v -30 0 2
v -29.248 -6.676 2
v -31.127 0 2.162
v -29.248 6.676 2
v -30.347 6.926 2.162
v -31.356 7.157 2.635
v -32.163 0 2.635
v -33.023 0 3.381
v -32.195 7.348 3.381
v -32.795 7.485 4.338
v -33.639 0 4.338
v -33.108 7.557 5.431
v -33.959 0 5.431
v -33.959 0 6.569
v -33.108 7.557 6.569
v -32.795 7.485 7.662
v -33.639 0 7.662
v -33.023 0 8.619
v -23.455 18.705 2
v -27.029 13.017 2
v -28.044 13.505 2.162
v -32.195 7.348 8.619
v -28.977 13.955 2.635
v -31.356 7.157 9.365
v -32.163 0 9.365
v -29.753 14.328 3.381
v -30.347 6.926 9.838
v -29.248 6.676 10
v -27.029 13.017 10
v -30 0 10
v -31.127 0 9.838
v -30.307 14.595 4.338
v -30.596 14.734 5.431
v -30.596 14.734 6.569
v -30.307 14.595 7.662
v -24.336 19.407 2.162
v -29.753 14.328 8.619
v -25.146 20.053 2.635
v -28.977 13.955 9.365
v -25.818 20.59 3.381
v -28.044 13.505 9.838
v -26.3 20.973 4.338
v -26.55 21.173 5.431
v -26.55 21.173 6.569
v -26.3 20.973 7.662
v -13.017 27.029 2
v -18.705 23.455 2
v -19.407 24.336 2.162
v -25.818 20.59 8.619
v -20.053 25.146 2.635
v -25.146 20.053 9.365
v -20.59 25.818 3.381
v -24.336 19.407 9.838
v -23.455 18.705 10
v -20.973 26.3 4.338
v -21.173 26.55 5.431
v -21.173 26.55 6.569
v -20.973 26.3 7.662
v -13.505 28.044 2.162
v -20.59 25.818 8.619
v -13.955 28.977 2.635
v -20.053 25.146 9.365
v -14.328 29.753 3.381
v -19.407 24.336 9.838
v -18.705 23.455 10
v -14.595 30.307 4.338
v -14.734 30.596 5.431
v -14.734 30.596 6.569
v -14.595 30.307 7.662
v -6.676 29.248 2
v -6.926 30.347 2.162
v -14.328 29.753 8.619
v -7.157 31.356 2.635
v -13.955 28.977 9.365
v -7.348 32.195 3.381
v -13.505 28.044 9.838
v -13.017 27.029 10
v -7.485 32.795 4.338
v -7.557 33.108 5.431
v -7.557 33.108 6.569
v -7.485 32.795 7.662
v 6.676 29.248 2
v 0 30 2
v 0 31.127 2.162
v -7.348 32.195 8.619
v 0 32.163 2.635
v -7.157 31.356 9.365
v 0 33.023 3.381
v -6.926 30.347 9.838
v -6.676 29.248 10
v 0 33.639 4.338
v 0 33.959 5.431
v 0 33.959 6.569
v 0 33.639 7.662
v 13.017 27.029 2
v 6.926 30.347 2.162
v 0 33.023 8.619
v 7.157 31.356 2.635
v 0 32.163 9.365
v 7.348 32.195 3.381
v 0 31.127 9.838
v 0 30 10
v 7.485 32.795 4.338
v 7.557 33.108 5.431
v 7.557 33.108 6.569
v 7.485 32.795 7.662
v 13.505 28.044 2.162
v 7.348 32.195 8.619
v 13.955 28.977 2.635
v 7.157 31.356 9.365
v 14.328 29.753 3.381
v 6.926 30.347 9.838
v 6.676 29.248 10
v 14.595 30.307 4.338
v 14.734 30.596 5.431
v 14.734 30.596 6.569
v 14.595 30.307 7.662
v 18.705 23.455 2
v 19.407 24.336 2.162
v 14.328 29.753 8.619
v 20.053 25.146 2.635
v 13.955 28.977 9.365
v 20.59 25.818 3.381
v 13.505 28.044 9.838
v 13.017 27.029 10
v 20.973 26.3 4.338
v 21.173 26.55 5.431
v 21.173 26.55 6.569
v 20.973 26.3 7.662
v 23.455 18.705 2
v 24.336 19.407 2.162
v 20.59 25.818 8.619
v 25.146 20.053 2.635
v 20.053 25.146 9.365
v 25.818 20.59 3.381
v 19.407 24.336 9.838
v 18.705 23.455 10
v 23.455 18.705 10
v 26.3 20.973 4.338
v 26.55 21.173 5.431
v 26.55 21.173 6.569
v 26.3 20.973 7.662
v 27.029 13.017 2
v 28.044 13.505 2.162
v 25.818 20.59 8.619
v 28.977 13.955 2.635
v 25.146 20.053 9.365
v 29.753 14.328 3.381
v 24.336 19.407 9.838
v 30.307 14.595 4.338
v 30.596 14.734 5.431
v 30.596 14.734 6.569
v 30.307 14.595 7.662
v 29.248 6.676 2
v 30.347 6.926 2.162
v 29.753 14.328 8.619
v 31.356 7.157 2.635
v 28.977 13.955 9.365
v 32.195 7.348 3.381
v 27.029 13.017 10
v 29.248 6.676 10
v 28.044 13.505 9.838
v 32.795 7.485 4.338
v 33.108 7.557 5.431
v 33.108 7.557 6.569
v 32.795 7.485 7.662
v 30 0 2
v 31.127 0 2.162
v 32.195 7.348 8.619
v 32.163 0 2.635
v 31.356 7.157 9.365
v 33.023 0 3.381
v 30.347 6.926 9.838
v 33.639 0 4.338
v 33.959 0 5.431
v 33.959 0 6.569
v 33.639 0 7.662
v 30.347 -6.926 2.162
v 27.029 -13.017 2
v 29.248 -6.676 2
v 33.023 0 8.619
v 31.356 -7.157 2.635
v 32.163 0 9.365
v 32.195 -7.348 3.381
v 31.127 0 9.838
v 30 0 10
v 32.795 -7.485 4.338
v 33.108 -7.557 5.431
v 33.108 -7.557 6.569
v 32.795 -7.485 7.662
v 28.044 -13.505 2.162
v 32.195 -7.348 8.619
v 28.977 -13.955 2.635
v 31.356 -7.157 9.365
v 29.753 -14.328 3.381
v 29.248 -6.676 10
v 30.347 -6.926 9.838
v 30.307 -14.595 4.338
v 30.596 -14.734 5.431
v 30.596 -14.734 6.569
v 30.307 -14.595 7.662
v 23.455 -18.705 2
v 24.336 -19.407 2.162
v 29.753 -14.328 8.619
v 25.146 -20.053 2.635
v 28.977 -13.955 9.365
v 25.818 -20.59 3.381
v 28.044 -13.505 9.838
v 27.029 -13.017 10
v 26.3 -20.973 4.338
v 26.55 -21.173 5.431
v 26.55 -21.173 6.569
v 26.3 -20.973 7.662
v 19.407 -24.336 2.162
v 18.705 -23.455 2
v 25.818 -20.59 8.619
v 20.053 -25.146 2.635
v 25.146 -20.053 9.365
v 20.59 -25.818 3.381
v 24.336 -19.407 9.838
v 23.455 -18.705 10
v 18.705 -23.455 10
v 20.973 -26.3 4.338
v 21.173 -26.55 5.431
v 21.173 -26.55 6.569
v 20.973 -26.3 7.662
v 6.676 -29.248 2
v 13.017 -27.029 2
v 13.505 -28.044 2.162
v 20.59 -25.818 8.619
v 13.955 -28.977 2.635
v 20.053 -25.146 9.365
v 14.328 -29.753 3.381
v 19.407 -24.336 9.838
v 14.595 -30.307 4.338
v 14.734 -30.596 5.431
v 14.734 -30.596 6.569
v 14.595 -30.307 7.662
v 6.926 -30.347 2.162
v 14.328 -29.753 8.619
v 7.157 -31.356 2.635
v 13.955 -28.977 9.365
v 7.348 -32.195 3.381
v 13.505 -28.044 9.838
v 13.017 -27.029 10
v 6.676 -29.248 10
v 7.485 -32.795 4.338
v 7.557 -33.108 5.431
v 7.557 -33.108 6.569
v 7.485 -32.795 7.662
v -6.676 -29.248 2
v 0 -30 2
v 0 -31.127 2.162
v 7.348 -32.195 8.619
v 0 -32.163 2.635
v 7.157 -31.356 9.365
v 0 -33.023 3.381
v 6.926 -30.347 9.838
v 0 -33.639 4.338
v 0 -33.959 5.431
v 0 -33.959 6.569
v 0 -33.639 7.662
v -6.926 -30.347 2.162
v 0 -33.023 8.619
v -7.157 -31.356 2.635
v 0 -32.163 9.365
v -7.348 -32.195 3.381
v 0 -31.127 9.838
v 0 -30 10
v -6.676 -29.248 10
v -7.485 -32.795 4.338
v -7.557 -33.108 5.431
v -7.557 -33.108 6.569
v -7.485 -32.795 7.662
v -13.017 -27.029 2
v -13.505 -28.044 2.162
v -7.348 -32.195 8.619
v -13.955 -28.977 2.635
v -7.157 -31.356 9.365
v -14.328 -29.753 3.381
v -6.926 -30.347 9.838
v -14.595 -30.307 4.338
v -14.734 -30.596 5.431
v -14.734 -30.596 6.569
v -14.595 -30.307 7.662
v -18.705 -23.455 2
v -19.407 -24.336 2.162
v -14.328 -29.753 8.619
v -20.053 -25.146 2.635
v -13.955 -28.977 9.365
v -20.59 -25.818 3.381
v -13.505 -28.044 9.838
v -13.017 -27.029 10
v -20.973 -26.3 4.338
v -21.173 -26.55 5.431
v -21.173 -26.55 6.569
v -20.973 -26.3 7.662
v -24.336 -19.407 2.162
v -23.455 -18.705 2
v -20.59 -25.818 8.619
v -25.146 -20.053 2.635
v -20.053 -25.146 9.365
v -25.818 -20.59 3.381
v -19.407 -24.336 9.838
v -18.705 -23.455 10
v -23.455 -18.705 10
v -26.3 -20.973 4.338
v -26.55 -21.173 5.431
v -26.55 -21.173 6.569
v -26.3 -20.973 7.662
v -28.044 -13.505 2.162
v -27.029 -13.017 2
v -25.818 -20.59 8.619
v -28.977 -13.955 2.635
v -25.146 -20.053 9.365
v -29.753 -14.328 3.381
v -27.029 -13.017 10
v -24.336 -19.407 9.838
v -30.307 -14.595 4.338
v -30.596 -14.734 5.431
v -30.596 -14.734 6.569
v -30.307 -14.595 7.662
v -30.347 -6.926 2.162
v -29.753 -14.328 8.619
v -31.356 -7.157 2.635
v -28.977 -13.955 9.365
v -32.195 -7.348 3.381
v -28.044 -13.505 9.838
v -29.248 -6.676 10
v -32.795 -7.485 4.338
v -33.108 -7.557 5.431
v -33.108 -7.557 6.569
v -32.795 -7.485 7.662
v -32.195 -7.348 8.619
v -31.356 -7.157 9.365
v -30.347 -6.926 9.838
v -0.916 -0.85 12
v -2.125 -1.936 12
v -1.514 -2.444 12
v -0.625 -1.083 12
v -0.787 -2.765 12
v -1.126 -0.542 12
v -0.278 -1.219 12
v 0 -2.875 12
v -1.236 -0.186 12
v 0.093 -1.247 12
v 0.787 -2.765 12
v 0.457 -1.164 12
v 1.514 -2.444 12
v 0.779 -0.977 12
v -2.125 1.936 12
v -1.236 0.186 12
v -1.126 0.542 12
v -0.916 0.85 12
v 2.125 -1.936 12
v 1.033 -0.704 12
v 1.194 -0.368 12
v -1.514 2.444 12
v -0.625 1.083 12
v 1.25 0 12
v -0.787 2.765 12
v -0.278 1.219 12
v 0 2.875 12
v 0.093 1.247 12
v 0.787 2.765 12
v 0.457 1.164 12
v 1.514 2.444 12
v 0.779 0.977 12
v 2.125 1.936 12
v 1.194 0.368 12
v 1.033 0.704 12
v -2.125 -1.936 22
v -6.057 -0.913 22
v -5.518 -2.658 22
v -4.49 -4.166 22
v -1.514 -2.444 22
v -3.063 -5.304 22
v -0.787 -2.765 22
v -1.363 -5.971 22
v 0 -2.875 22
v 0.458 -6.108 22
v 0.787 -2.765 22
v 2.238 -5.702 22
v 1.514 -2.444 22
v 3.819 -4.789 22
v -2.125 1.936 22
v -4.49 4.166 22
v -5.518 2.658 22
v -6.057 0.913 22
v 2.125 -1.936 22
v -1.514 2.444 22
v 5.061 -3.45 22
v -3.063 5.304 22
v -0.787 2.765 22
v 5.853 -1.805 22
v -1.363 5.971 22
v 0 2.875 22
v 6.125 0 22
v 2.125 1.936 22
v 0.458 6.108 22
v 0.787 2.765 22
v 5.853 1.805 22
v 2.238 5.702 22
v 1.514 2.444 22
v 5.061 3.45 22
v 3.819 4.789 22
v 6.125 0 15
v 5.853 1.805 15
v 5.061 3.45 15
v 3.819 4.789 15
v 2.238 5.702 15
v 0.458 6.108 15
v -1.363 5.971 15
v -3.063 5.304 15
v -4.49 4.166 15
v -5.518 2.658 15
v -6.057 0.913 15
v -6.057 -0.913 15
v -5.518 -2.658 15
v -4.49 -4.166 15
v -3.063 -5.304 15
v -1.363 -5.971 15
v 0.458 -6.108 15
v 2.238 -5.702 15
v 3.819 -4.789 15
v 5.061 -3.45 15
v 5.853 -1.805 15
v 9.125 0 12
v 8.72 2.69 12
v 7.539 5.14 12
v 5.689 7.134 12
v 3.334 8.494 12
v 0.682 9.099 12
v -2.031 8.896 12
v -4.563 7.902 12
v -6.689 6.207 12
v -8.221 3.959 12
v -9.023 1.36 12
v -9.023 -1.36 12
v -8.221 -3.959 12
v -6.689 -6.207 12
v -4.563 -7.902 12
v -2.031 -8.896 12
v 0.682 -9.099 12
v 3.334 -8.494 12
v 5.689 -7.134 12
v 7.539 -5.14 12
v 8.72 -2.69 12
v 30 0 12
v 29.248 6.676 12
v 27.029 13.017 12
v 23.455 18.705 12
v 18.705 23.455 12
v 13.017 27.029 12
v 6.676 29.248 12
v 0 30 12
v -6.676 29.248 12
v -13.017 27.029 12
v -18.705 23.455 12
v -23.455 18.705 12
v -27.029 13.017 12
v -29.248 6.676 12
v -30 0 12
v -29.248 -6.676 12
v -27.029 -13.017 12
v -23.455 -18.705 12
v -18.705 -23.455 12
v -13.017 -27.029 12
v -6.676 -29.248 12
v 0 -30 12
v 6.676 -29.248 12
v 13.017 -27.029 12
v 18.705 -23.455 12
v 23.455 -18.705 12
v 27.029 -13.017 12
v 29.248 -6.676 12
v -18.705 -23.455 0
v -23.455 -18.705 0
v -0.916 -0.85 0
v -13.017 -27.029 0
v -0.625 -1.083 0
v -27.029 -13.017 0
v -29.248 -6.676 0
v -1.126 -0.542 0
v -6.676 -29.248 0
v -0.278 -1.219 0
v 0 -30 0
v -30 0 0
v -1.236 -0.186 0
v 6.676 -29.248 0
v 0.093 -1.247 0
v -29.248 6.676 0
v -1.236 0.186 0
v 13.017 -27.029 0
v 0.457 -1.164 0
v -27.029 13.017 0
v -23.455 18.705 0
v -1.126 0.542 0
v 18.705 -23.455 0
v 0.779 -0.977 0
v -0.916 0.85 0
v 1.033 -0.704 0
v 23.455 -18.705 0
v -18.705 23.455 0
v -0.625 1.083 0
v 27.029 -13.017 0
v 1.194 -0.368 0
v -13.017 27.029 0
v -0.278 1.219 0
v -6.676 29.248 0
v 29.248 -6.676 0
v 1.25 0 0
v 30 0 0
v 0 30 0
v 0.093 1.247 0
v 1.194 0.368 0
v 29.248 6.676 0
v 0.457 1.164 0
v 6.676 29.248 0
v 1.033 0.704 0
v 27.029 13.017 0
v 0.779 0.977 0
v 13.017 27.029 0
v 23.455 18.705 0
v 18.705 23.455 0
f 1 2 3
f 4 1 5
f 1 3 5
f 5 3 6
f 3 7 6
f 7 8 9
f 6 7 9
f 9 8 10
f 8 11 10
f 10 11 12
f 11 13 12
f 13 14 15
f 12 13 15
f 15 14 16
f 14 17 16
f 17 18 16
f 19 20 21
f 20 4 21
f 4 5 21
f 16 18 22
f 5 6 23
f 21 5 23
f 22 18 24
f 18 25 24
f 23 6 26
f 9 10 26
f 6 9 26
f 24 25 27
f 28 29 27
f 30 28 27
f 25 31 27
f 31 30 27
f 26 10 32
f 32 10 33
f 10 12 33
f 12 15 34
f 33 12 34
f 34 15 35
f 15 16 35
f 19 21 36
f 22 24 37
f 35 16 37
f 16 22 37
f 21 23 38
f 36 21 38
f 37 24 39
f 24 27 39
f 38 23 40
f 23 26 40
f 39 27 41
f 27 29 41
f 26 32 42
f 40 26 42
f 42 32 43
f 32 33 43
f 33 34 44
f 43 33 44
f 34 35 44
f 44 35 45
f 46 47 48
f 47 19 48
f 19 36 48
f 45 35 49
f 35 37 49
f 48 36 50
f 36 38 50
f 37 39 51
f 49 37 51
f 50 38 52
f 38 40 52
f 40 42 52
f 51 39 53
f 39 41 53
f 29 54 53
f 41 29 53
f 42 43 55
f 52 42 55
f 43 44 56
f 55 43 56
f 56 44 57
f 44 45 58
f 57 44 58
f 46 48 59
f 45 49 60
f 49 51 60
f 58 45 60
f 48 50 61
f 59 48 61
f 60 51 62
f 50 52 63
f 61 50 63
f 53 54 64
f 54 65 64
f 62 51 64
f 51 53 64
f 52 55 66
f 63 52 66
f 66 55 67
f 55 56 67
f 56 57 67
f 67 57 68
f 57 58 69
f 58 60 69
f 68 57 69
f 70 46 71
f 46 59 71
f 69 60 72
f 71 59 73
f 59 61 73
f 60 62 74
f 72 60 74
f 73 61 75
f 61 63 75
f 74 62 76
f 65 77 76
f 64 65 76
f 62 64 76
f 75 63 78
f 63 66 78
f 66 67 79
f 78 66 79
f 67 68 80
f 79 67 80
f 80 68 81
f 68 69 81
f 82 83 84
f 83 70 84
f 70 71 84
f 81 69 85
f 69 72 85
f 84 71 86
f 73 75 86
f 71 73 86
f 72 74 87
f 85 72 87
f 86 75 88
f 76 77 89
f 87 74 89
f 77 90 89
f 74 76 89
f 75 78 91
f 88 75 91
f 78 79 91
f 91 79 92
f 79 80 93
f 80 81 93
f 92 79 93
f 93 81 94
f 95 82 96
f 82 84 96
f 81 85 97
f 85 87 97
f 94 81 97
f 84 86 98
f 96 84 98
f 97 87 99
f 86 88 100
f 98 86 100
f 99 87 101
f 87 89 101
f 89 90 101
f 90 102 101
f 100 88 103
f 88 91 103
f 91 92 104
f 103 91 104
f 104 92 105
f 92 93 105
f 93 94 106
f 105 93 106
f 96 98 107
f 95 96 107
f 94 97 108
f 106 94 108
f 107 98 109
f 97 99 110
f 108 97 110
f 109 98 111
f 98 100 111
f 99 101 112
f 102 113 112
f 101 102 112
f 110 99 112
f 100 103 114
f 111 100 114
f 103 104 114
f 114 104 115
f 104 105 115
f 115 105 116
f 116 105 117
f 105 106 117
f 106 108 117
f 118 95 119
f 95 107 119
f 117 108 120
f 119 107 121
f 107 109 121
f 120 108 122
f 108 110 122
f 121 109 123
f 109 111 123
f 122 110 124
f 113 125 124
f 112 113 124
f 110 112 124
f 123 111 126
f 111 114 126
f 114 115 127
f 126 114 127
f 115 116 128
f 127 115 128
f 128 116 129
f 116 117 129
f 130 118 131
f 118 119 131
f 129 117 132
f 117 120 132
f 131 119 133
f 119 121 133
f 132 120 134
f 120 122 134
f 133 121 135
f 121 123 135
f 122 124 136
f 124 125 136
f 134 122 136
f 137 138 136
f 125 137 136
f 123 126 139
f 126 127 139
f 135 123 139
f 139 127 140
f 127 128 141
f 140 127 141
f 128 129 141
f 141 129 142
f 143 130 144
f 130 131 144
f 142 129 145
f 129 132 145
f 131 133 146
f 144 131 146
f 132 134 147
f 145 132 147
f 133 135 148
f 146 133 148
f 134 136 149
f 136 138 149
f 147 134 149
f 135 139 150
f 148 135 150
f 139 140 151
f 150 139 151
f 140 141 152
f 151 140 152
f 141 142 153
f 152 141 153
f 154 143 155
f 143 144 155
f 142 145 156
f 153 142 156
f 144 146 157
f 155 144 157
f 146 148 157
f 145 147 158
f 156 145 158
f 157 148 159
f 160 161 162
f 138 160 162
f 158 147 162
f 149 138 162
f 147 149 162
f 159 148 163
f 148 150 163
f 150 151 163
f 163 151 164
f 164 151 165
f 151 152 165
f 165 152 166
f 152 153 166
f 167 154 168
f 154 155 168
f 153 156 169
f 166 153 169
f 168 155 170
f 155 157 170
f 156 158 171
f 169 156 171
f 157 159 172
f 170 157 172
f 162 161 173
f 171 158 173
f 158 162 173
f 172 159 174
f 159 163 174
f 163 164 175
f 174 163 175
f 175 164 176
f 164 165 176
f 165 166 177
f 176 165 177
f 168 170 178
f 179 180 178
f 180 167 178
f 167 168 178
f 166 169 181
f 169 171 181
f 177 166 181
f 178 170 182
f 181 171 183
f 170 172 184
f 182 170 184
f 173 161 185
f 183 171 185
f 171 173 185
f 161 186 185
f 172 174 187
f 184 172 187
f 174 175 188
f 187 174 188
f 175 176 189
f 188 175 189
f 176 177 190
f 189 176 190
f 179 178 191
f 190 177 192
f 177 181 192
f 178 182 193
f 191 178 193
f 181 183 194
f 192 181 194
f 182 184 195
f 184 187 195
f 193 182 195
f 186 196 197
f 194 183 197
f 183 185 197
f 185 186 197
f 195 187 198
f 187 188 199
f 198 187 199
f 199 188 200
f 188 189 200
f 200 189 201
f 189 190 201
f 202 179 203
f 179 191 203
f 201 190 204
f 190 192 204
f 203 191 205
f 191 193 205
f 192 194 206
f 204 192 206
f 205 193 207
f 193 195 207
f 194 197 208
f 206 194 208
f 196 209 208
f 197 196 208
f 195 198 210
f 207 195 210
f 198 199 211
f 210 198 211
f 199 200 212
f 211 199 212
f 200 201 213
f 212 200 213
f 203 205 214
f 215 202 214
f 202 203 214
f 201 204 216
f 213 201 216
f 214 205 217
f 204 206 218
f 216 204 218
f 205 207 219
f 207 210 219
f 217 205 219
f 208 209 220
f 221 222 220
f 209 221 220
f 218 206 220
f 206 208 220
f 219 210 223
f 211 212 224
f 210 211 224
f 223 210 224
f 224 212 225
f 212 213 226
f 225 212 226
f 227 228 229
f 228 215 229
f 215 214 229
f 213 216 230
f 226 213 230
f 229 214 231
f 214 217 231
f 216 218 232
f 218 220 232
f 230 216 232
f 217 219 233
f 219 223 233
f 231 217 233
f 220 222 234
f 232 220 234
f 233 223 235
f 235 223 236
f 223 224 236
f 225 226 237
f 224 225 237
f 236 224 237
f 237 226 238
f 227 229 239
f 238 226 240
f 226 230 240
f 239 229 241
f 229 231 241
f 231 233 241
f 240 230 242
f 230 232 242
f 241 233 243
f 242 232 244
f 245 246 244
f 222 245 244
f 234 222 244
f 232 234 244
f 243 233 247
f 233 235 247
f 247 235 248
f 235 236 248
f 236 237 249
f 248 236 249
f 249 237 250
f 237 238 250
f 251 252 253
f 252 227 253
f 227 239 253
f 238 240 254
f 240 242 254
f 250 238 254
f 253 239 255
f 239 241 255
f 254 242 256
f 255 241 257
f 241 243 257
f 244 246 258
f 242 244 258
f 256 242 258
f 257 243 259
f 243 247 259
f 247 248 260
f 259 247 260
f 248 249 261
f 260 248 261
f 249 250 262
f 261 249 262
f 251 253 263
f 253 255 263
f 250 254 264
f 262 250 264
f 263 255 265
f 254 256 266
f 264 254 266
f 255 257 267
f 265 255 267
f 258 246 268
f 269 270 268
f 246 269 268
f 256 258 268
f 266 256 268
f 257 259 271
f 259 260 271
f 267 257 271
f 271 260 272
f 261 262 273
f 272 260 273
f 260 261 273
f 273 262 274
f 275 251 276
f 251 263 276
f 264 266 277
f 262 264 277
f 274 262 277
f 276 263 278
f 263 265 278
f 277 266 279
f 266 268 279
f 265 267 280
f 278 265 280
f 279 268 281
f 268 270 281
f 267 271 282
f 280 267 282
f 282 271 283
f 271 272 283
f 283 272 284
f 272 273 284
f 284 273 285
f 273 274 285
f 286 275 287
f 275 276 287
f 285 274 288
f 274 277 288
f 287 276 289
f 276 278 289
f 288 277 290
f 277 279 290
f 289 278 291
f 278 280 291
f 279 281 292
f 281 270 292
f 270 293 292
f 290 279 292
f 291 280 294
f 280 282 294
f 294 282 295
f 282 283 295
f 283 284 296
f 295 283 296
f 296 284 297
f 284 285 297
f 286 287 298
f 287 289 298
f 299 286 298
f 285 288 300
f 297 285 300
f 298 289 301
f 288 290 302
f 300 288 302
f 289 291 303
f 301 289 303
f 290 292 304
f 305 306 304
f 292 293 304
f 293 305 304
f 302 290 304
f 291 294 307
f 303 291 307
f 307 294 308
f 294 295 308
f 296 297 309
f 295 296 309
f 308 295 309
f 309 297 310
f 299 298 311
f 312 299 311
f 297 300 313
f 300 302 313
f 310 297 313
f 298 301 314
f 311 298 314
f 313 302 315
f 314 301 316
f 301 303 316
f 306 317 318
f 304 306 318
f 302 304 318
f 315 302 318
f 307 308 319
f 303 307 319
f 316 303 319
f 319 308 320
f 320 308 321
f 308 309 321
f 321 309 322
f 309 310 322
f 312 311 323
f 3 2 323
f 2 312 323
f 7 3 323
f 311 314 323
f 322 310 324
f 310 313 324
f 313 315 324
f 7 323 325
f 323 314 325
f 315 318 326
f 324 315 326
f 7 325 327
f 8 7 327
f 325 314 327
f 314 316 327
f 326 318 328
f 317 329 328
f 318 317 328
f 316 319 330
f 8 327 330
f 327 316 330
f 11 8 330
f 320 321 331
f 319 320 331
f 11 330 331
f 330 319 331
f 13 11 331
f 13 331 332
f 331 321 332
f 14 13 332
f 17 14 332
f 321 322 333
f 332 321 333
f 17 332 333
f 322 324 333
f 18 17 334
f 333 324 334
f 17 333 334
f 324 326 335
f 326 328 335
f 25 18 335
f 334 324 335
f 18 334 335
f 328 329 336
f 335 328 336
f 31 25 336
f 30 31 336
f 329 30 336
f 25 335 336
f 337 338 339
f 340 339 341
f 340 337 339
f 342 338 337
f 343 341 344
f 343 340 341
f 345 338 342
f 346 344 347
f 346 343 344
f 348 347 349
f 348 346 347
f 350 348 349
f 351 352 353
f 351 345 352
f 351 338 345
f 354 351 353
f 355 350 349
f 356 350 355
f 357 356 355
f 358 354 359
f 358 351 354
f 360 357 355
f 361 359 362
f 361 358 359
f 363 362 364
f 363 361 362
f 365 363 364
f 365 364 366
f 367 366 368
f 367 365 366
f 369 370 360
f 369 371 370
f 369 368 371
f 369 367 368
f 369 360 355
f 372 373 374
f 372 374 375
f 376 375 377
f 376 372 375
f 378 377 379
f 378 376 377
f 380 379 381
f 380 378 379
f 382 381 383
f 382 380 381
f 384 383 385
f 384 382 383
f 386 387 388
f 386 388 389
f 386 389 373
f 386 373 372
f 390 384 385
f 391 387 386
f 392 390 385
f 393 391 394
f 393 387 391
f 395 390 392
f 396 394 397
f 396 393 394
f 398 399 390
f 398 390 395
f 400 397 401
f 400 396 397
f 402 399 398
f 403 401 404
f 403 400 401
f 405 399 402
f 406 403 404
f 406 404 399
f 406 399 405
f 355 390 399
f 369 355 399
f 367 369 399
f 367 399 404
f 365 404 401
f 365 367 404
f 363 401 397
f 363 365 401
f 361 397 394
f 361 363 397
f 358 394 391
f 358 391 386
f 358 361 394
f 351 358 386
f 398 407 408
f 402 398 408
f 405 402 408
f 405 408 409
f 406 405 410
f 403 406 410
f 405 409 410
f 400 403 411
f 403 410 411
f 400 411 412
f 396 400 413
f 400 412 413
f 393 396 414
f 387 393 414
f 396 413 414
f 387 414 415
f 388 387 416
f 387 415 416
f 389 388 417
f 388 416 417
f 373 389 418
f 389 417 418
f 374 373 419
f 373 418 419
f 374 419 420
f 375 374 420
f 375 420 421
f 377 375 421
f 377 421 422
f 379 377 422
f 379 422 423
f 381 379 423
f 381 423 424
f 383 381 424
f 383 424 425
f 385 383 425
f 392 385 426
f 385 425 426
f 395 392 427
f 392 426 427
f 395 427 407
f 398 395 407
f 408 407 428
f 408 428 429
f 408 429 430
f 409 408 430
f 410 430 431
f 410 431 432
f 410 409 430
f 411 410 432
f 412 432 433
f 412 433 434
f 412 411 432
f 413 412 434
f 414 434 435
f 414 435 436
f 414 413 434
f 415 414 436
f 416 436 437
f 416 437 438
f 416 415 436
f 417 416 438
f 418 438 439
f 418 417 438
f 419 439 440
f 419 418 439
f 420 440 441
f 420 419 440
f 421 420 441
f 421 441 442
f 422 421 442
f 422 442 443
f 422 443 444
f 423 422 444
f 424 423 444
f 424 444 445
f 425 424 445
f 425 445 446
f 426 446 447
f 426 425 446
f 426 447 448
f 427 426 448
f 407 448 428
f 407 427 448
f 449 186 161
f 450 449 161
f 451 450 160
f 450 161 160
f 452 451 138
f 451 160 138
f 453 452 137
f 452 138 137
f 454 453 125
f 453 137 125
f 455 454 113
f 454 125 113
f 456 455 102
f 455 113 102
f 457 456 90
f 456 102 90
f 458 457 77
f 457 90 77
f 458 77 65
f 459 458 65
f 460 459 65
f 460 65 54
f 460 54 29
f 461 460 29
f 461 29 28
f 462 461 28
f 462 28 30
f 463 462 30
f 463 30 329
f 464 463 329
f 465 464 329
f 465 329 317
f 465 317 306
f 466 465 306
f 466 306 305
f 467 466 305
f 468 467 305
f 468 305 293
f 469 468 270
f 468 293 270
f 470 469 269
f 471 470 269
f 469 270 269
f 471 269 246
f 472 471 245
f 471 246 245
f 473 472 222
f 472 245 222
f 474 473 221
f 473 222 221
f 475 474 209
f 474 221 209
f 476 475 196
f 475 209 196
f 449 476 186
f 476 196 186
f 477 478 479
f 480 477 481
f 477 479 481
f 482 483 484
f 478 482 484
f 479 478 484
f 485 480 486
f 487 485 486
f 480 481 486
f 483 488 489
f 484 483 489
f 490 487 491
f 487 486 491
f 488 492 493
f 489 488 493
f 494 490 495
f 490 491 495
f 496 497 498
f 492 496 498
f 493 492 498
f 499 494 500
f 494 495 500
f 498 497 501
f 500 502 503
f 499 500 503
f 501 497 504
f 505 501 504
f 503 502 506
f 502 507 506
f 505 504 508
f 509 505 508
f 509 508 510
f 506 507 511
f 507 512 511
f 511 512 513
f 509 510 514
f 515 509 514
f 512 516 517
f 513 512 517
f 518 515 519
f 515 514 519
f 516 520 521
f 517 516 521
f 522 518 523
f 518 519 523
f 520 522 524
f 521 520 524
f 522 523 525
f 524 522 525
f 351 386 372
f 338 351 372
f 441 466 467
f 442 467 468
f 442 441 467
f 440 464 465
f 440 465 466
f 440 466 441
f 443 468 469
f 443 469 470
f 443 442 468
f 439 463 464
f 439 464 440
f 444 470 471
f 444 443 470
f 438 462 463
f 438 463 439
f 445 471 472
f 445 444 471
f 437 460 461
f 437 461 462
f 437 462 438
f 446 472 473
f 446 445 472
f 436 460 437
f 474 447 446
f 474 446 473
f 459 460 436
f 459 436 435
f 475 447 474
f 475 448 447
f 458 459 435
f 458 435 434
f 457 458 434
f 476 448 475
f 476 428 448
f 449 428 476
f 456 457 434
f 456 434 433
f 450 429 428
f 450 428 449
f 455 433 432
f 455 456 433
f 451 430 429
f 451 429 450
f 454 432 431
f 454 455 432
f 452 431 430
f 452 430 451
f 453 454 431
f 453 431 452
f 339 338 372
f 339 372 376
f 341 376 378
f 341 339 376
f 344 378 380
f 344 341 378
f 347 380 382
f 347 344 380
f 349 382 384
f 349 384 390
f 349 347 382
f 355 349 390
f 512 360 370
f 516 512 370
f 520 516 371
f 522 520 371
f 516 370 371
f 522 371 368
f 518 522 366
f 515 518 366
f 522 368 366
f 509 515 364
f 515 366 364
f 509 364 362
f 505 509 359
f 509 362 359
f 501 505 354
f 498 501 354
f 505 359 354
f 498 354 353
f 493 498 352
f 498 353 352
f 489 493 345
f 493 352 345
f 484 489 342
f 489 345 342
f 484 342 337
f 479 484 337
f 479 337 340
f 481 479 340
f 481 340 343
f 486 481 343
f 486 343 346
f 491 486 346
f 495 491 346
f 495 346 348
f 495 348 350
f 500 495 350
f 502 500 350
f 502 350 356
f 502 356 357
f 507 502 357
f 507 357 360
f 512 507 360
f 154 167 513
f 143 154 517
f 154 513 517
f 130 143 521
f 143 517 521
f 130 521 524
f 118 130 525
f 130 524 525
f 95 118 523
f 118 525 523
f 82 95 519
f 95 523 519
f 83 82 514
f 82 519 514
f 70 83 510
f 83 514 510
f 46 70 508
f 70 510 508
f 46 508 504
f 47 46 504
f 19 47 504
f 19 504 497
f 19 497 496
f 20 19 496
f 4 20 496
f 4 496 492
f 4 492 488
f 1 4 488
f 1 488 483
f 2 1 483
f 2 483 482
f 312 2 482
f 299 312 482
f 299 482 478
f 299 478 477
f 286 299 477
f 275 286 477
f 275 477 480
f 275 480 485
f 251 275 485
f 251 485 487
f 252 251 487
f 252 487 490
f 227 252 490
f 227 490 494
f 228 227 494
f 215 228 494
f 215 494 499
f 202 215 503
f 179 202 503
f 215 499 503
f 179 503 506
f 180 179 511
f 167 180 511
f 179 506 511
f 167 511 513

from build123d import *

# Parameters (mm, degrees)
CROQUIS1_R              = 30
SALIENTE_EXTRUIR1_DEPTH = 12
CROQUIS2_R              = 4
CROQUIS3_R              = 6.125
SALIENTE_EXTRUIR2_DEPTH = 10
CROQUIS4_R              = 1.25
CORTAR_EXTRUIR1_DEPTH   = 45.09081537
CHAFL_N1_SIZE           = 3
CROQUIS5_R              = 4


with BuildPart() as part:
    # Croquis1 → Saliente-Extruir1 (new body)
    with BuildSketch(Plane.XY):
        Circle(CROQUIS1_R)
    extrude(amount=SALIENTE_EXTRUIR1_DEPTH)

    # Croquis2 → Cortar-Revolución1 (revolve, cut)
    with BuildSketch(Plane(origin=(0, 0, 0), x_dir=(1, 0, 0), z_dir=(0, 1, 0))):
        with Locations((-30, -6)):
            Circle(CROQUIS2_R)
    revolve(axis=Axis((0, 0, 0), (0, 0, 1)), mode=Mode.SUBTRACT)

    # Croquis3 → Saliente-Extruir2 (add)
    with BuildSketch(Plane.XY.offset(12)):
        Circle(CROQUIS3_R)
        with BuildLine():
            Line((-2.125, 1.936491673), (-2.125, -1.936491673))
            ThreePointArc((-2.125, -1.936491673), (0, -2.875), (2.125, -1.936491673))
            Line((2.125, -1.936491673), (2.125, 1.936491673))
            ThreePointArc((2.125, 1.936491673), (0, 2.875), (-2.125, 1.936491673))
        make_face(mode=Mode.SUBTRACT)
    extrude(amount=SALIENTE_EXTRUIR2_DEPTH)

    # Croquis4 → Cortar-Extruir1 (cut, through all)
    with BuildSketch(Plane.XY.offset(12)):
        Circle(CROQUIS4_R)
    extrude(amount=-CORTAR_EXTRUIR1_DEPTH, mode=Mode.SUBTRACT)

    # Chaflán1
    chafl_n1_edges = [part.edges().sort_by_distance(p)[0] for p in [
        (-6.125, 0, 12),
    ]]
    chamfer(chafl_n1_edges, length=CHAFL_N1_SIZE)

    # Croquis5 → Revolución1 (revolve)
    with BuildSketch(Plane(origin=(0, 0, 0), x_dir=(0, 0, -1), z_dir=(1, 0, 0)), mode=Mode.PRIVATE) as revoluci_n1_sk:
        with Locations((-6, 30)):
            Circle(CROQUIS5_R)
    revolve(revoluci_n1_sk.sketch.rotate(Axis((0, 0, 0), (0, 0, -1)), 270), axis=Axis((0, 0, 0), (0, 0, -1)))


solid = part.part
